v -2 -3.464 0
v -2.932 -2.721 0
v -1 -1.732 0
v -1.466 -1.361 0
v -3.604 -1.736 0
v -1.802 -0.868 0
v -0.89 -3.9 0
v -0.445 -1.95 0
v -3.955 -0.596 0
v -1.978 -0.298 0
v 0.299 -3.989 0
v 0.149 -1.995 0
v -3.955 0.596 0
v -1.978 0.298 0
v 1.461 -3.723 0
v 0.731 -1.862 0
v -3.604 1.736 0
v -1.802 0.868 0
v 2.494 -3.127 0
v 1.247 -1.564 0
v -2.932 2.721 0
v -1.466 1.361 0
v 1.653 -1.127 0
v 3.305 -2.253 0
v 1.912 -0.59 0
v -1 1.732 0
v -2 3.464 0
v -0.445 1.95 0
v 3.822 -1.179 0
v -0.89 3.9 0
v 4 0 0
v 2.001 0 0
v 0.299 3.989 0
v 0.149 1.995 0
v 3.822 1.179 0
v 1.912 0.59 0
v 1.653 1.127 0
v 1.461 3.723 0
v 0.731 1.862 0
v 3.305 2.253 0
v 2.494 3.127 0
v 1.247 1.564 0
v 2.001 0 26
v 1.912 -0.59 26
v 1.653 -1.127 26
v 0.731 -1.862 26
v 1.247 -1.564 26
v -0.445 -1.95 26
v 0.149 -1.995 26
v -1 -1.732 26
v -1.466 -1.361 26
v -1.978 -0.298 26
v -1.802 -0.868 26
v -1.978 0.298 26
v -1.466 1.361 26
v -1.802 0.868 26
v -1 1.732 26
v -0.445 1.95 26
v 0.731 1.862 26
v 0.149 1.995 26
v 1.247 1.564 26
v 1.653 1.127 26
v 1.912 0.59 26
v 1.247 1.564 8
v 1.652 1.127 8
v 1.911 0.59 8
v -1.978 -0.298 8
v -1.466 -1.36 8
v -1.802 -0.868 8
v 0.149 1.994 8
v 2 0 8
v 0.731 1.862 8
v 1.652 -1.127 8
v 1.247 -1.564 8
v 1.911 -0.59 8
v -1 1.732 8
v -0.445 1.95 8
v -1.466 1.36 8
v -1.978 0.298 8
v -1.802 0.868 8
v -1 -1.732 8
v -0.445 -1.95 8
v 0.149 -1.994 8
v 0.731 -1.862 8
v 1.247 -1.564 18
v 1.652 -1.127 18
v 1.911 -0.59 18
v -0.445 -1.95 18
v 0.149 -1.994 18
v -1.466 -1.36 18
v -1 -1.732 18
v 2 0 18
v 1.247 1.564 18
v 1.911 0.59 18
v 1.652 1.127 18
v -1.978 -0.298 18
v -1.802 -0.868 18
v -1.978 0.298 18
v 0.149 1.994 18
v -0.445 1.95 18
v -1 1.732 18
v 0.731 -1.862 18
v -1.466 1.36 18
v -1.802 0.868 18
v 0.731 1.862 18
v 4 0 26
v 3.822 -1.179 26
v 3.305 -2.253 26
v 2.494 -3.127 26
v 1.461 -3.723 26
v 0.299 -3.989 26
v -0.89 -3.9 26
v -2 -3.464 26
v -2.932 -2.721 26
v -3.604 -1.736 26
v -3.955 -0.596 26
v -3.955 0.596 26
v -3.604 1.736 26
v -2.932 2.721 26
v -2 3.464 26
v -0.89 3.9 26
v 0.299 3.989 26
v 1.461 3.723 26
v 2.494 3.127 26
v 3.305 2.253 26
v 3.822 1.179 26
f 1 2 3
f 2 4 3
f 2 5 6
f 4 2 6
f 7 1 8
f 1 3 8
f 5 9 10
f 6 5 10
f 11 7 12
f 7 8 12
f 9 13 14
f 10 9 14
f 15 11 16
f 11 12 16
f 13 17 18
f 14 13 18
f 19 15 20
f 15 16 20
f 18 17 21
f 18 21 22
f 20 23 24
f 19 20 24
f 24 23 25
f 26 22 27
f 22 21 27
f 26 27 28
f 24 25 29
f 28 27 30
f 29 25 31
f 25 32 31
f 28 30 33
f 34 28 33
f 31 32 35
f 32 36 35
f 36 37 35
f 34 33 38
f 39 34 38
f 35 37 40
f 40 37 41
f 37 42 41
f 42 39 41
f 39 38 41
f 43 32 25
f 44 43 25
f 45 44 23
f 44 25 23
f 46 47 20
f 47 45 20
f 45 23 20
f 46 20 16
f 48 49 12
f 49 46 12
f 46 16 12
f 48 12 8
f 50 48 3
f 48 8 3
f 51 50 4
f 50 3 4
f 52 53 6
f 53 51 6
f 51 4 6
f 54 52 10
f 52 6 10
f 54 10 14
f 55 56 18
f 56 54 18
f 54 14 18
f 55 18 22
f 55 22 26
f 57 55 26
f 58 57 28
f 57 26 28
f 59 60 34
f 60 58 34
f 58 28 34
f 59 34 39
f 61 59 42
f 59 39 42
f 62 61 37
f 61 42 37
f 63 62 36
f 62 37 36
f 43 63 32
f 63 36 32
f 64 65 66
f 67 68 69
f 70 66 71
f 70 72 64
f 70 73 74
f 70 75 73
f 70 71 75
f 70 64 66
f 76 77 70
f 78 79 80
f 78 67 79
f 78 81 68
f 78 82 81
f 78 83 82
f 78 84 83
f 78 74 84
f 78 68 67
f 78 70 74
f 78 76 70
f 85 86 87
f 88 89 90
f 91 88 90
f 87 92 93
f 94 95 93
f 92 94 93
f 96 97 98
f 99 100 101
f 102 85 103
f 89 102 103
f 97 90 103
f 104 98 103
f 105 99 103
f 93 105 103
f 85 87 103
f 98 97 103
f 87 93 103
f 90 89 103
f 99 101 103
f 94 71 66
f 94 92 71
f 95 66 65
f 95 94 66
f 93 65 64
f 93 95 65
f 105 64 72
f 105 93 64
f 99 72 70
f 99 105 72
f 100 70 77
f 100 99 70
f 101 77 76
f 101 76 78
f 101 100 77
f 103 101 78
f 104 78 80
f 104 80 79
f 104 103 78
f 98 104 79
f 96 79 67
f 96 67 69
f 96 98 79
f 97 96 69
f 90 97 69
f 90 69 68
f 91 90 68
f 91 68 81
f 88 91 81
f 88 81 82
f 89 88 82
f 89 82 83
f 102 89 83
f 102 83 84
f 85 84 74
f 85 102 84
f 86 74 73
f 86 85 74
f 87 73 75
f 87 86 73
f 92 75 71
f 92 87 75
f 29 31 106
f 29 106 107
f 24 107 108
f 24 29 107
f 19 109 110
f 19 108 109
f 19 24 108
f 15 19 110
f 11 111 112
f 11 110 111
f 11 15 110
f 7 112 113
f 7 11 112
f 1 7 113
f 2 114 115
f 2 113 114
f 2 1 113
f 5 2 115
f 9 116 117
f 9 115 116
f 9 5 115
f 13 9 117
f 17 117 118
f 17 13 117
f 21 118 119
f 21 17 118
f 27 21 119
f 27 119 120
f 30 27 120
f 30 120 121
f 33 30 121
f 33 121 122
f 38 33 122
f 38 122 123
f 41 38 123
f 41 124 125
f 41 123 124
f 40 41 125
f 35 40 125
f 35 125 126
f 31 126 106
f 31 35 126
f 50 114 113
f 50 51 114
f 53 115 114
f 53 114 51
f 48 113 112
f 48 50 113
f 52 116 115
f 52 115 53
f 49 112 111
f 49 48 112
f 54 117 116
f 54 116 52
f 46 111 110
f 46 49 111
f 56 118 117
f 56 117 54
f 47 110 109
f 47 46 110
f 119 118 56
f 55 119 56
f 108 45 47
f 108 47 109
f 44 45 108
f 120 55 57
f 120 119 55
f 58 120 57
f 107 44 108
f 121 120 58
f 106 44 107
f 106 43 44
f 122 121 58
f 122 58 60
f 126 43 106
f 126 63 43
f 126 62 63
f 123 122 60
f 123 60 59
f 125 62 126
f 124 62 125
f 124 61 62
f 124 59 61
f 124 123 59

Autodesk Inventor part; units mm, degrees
ref_plane "YZ Plane" through (0, 0, 0) normal (1, 0, 0) x (0, 1, 0)
ref_plane "XZ Plane" through (0, 0, 0) normal (0, 1, 0) x (-1, 0, 0)
sketch "スケッチ1" plane through (0, 0, 0) normal (0, 0, 1) x (1, 0, 0)
  circle A0 centre (0, 0) radius 4
  circle A1 centre (0, 0) radius 2.0005
  dimension "d0" = 8
  dimension "d1" = 4.001
extrude "押し出し1" add sketch "スケッチ1" along normal blind 26
sketch "スケッチ2" plane through (0, 0, 26) normal (0, 0, 1) x (1, 0, 0)
  circle A0 centre (0, 0) radius 2
  dimension "d4" = 4
extrude "押し出し2" add sketch "スケッチ2" against normal blind 25
hole "穴1" at (0, 0, 26) direction (0, 0, -1) diameter 4 depth 8 tip angle 118
hole "穴2" at (0, 0, 0) direction (0, 0, 1) diameter 4 depth 8 tip angle 118
ref_plane "作業平面1" through (0, 0, 8) normal (0, 0, -1) x (-1, 0, 0)
sketch "スケッチ3" plane through (0, 0, 8) normal (0, 0, -1) x (-1, 0, 0)
  circle A0 centre (0, 0) radius 2.0005 projected
  circle A1 centre (0, 0) radius 4 projected
  circle A2 centre (0, 0) radius 2 projected
sketch "スケッチ3 outline for 押し出し3" plane through (0, 0, 8) normal (0, 0, -1) x (-1, 0, 0)
  circle A0 centre (0, 0) radius 2
extrude "押し出し3" add sketch "スケッチ3 outline for 押し出し3" against normal blind 10
properties part number "スペーサーm4-26　簡易筒型" material "アルミニウム 2014-T4"
